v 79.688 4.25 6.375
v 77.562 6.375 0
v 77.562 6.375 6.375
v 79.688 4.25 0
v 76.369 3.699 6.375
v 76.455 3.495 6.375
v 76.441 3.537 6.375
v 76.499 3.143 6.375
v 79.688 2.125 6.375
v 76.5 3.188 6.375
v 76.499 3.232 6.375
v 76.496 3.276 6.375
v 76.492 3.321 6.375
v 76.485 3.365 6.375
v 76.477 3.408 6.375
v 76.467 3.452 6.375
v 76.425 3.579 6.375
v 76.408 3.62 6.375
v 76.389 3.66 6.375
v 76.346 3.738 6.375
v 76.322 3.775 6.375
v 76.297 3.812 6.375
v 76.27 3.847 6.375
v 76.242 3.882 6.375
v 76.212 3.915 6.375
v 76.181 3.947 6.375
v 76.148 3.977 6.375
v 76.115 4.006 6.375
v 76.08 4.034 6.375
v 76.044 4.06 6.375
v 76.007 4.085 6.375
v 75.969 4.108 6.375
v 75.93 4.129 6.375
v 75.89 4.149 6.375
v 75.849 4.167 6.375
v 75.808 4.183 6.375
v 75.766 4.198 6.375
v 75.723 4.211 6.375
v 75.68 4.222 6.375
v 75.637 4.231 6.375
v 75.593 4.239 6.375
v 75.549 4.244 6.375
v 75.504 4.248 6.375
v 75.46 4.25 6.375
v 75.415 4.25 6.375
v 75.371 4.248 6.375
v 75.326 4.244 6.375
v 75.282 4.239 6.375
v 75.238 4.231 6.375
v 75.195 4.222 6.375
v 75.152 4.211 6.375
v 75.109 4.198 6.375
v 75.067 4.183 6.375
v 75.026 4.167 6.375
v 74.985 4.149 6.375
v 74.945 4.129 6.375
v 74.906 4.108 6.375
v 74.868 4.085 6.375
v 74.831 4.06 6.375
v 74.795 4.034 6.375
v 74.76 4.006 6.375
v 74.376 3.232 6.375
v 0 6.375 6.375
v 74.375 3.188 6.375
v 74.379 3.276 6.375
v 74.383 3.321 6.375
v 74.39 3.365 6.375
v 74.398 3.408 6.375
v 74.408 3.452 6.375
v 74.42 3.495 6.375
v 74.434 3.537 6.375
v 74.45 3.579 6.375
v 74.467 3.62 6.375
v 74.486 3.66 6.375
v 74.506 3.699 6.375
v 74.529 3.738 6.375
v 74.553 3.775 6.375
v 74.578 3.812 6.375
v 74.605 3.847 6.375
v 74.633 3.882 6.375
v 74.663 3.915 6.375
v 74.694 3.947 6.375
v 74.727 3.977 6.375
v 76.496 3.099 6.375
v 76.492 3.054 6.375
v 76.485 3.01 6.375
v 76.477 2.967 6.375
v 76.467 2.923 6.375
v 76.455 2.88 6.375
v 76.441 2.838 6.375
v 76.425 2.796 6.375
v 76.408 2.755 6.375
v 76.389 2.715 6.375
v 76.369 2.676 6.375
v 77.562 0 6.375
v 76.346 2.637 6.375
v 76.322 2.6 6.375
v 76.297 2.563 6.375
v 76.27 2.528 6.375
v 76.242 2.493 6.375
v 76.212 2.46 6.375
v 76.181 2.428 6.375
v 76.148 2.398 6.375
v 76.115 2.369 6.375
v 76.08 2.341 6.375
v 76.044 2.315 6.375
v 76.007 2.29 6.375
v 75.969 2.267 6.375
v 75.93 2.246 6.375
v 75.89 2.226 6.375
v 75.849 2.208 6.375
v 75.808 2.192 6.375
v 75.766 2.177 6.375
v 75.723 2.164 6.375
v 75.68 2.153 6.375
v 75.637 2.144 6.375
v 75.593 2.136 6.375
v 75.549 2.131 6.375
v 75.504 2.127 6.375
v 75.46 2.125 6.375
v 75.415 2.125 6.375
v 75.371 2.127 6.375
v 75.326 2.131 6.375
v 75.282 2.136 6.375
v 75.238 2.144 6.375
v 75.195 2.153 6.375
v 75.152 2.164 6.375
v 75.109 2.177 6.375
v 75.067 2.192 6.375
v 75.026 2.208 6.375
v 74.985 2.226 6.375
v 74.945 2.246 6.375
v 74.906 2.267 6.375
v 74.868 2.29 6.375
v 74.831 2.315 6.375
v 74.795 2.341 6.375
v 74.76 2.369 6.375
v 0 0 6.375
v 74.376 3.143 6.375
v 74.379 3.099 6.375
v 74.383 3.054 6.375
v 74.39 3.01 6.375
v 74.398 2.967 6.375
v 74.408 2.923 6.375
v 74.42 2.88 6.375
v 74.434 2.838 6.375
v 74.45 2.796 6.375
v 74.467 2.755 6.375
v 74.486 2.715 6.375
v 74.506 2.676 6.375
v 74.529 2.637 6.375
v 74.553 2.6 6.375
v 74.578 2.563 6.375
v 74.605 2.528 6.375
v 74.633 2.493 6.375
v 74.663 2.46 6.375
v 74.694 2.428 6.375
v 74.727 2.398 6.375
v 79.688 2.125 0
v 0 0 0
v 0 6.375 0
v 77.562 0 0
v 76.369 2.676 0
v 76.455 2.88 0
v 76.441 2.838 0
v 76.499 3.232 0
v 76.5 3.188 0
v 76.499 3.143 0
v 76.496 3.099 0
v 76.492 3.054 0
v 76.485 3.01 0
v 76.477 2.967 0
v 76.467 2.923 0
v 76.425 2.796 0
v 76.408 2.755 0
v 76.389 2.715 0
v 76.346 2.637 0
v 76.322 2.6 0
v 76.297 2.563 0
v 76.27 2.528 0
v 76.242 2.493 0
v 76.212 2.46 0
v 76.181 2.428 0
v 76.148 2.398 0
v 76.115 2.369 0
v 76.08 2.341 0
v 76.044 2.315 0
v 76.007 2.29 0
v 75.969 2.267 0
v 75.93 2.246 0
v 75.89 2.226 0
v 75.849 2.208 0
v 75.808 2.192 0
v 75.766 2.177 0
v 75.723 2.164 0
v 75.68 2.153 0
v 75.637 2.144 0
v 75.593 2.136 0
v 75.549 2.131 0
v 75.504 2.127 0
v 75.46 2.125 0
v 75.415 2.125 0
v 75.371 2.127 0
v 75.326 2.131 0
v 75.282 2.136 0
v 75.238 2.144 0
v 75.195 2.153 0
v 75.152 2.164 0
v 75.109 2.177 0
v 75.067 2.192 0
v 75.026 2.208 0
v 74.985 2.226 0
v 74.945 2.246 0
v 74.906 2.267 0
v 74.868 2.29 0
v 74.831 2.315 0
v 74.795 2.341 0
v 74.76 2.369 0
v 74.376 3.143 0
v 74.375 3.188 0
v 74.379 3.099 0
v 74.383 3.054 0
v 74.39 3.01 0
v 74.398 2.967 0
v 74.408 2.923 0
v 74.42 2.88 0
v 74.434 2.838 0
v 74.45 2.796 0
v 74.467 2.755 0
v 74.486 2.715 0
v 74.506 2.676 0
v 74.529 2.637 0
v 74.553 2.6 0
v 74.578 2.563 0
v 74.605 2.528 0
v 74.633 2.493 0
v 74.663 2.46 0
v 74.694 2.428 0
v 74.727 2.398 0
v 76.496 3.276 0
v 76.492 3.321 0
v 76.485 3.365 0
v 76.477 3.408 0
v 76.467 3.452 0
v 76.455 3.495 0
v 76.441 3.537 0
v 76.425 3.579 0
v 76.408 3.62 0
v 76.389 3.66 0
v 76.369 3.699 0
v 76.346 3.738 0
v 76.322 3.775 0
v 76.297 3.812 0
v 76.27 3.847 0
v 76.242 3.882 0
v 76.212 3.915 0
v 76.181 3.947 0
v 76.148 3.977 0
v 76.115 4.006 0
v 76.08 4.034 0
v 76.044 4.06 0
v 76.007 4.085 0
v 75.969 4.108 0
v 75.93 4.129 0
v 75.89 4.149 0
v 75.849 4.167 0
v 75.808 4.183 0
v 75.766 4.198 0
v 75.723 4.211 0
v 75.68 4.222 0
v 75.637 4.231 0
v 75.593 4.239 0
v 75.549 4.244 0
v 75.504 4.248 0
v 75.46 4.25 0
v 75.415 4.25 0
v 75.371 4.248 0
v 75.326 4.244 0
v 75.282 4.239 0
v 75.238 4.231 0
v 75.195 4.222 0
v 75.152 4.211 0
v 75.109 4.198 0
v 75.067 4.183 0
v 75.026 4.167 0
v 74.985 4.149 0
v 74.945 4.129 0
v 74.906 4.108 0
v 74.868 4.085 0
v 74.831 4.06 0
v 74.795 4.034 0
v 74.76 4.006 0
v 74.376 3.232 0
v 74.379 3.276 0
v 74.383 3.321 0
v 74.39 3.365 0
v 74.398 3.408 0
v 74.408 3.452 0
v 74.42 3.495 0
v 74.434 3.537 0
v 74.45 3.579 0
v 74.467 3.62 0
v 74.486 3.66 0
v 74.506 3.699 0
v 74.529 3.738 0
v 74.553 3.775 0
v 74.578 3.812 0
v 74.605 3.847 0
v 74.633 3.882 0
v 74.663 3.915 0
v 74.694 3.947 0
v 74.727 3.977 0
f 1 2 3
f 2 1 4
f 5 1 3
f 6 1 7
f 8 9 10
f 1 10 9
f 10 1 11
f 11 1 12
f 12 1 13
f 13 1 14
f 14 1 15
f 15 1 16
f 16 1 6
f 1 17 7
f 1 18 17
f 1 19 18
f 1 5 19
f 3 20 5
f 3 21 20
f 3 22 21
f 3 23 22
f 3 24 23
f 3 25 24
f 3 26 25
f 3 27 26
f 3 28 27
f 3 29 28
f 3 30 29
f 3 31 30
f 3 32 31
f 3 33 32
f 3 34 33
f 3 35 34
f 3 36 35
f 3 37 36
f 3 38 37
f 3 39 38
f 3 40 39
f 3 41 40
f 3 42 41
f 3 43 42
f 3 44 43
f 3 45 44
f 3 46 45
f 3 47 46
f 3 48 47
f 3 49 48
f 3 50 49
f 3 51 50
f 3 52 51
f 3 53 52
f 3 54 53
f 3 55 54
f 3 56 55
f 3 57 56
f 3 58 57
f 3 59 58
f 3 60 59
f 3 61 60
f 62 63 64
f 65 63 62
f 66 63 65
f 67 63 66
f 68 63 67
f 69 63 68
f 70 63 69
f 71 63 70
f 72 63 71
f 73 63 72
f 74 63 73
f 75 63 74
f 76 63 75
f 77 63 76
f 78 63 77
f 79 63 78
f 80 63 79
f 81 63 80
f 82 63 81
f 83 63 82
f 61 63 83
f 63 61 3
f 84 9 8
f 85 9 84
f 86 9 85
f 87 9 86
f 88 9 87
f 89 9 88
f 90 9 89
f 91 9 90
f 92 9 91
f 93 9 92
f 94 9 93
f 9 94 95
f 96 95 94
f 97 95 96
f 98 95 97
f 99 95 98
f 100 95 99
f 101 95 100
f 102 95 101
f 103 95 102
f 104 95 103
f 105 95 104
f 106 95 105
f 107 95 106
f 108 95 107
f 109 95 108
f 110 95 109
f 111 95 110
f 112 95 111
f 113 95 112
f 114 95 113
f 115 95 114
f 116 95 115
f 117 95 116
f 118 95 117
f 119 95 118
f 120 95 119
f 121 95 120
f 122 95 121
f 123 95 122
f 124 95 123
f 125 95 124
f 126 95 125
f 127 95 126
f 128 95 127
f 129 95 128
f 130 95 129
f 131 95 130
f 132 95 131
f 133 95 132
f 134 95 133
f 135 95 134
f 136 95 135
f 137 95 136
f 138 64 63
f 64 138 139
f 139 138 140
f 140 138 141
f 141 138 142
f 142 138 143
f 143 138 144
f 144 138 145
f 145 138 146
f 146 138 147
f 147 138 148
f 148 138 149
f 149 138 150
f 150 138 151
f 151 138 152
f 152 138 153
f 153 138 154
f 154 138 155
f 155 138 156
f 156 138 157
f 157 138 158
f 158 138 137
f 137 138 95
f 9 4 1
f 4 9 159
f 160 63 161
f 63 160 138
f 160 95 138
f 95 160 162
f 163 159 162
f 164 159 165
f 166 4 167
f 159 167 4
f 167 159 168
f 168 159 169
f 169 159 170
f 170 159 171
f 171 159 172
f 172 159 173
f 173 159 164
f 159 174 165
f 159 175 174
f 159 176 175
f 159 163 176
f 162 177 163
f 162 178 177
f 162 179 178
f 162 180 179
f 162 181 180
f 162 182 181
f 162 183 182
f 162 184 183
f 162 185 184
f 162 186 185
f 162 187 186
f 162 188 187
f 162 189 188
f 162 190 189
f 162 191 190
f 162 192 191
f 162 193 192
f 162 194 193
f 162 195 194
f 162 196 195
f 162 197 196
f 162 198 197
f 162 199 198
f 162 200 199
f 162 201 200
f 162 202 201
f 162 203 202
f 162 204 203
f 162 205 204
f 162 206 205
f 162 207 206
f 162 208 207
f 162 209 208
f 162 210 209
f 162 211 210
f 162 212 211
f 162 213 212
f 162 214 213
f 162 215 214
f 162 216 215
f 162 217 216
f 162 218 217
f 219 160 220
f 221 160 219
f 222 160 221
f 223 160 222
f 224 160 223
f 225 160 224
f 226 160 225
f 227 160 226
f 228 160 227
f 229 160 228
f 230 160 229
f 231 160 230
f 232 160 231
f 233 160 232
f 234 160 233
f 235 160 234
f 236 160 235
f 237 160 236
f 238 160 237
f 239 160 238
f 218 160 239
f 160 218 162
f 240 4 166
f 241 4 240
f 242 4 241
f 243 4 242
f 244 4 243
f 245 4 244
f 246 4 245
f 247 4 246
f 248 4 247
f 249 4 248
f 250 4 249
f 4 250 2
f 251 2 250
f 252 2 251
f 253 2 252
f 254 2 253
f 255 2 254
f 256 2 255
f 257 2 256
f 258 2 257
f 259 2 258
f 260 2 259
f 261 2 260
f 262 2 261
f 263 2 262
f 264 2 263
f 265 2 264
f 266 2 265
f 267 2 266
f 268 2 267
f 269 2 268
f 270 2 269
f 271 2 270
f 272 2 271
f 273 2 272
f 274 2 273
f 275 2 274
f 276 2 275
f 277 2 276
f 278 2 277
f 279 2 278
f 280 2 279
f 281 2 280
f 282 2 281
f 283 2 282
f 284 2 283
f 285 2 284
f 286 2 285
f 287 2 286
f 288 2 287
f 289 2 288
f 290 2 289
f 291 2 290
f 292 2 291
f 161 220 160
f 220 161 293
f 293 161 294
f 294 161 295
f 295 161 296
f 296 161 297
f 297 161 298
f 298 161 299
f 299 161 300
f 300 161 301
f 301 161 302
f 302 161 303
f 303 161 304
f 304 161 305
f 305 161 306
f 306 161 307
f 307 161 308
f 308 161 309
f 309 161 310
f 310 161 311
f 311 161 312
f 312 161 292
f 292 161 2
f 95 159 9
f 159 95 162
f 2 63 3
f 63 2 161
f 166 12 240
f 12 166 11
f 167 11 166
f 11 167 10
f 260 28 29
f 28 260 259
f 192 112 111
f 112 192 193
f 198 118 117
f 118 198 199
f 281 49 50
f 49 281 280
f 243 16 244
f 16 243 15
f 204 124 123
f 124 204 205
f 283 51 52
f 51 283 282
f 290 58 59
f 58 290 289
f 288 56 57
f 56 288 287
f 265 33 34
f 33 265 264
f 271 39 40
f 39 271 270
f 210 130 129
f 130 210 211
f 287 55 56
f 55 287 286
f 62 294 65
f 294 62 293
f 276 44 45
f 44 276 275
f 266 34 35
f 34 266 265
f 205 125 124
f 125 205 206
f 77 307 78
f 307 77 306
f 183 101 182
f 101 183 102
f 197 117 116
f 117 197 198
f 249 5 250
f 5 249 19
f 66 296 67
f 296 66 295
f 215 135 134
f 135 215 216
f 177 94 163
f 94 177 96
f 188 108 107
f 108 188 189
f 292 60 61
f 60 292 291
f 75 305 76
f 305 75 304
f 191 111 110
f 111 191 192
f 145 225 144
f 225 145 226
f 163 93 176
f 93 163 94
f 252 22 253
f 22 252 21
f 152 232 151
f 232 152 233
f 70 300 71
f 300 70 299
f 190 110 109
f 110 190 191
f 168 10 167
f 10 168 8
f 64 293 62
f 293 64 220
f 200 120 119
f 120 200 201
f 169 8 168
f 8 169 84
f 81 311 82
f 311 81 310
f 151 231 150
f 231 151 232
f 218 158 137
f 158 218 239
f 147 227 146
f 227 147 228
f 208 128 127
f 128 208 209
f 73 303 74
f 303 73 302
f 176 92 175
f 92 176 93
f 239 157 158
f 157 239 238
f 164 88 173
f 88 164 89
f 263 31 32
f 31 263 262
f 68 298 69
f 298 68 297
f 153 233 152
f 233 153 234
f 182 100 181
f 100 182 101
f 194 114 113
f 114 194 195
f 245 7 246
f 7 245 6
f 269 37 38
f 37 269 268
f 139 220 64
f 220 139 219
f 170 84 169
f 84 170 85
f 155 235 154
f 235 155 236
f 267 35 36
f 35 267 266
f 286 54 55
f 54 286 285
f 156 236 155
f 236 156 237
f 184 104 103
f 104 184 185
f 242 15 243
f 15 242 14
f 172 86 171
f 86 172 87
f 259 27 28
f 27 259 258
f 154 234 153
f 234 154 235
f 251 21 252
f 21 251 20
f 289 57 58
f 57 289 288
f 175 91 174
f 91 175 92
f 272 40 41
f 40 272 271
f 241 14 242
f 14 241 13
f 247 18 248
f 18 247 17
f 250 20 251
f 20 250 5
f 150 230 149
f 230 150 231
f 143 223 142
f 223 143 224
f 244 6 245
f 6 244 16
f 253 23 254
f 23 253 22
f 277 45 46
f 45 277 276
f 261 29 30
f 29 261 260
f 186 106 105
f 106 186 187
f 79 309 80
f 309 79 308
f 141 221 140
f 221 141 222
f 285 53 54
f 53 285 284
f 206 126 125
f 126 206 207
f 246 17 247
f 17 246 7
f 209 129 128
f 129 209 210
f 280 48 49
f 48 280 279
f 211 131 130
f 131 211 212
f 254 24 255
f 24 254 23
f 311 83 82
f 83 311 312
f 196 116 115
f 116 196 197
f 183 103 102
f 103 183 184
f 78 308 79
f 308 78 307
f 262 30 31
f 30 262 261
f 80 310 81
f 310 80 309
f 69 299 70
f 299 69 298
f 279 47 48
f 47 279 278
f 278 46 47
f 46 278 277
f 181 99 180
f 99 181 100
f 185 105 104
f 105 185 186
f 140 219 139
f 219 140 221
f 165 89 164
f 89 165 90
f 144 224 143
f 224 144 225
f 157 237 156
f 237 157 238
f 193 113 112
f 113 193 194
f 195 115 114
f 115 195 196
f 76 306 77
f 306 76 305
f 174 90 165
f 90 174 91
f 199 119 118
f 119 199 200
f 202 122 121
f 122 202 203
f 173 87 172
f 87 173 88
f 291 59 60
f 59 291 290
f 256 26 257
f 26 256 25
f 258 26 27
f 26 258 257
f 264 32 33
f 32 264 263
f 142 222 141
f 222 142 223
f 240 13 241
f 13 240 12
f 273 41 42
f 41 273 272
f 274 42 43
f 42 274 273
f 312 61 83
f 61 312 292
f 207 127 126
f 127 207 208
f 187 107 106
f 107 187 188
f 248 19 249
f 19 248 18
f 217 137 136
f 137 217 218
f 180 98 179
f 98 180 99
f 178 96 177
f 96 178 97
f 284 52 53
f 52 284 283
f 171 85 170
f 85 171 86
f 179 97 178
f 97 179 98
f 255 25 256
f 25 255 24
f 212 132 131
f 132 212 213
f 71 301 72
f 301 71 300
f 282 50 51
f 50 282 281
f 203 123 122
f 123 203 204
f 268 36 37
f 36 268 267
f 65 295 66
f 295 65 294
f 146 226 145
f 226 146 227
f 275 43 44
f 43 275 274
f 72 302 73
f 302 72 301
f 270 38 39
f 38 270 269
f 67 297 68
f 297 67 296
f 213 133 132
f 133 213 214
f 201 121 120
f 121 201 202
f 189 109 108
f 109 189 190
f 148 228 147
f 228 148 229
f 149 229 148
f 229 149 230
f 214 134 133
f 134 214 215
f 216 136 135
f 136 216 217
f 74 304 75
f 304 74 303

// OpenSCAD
$fn = 150;

difference() {
	linear_extrude(height = 6.375) {
		polygon(points = [[0, 0], [0, 6.375], [77.5625, 6.375], [79.6875, 4.25], [79.6875, 2.125], [77.5625, 0]]);
	}
	translate(v = [75.4375, 3.1875, -1]) {
		cylinder(d = 2.125, h = 8.375);
	}
}
